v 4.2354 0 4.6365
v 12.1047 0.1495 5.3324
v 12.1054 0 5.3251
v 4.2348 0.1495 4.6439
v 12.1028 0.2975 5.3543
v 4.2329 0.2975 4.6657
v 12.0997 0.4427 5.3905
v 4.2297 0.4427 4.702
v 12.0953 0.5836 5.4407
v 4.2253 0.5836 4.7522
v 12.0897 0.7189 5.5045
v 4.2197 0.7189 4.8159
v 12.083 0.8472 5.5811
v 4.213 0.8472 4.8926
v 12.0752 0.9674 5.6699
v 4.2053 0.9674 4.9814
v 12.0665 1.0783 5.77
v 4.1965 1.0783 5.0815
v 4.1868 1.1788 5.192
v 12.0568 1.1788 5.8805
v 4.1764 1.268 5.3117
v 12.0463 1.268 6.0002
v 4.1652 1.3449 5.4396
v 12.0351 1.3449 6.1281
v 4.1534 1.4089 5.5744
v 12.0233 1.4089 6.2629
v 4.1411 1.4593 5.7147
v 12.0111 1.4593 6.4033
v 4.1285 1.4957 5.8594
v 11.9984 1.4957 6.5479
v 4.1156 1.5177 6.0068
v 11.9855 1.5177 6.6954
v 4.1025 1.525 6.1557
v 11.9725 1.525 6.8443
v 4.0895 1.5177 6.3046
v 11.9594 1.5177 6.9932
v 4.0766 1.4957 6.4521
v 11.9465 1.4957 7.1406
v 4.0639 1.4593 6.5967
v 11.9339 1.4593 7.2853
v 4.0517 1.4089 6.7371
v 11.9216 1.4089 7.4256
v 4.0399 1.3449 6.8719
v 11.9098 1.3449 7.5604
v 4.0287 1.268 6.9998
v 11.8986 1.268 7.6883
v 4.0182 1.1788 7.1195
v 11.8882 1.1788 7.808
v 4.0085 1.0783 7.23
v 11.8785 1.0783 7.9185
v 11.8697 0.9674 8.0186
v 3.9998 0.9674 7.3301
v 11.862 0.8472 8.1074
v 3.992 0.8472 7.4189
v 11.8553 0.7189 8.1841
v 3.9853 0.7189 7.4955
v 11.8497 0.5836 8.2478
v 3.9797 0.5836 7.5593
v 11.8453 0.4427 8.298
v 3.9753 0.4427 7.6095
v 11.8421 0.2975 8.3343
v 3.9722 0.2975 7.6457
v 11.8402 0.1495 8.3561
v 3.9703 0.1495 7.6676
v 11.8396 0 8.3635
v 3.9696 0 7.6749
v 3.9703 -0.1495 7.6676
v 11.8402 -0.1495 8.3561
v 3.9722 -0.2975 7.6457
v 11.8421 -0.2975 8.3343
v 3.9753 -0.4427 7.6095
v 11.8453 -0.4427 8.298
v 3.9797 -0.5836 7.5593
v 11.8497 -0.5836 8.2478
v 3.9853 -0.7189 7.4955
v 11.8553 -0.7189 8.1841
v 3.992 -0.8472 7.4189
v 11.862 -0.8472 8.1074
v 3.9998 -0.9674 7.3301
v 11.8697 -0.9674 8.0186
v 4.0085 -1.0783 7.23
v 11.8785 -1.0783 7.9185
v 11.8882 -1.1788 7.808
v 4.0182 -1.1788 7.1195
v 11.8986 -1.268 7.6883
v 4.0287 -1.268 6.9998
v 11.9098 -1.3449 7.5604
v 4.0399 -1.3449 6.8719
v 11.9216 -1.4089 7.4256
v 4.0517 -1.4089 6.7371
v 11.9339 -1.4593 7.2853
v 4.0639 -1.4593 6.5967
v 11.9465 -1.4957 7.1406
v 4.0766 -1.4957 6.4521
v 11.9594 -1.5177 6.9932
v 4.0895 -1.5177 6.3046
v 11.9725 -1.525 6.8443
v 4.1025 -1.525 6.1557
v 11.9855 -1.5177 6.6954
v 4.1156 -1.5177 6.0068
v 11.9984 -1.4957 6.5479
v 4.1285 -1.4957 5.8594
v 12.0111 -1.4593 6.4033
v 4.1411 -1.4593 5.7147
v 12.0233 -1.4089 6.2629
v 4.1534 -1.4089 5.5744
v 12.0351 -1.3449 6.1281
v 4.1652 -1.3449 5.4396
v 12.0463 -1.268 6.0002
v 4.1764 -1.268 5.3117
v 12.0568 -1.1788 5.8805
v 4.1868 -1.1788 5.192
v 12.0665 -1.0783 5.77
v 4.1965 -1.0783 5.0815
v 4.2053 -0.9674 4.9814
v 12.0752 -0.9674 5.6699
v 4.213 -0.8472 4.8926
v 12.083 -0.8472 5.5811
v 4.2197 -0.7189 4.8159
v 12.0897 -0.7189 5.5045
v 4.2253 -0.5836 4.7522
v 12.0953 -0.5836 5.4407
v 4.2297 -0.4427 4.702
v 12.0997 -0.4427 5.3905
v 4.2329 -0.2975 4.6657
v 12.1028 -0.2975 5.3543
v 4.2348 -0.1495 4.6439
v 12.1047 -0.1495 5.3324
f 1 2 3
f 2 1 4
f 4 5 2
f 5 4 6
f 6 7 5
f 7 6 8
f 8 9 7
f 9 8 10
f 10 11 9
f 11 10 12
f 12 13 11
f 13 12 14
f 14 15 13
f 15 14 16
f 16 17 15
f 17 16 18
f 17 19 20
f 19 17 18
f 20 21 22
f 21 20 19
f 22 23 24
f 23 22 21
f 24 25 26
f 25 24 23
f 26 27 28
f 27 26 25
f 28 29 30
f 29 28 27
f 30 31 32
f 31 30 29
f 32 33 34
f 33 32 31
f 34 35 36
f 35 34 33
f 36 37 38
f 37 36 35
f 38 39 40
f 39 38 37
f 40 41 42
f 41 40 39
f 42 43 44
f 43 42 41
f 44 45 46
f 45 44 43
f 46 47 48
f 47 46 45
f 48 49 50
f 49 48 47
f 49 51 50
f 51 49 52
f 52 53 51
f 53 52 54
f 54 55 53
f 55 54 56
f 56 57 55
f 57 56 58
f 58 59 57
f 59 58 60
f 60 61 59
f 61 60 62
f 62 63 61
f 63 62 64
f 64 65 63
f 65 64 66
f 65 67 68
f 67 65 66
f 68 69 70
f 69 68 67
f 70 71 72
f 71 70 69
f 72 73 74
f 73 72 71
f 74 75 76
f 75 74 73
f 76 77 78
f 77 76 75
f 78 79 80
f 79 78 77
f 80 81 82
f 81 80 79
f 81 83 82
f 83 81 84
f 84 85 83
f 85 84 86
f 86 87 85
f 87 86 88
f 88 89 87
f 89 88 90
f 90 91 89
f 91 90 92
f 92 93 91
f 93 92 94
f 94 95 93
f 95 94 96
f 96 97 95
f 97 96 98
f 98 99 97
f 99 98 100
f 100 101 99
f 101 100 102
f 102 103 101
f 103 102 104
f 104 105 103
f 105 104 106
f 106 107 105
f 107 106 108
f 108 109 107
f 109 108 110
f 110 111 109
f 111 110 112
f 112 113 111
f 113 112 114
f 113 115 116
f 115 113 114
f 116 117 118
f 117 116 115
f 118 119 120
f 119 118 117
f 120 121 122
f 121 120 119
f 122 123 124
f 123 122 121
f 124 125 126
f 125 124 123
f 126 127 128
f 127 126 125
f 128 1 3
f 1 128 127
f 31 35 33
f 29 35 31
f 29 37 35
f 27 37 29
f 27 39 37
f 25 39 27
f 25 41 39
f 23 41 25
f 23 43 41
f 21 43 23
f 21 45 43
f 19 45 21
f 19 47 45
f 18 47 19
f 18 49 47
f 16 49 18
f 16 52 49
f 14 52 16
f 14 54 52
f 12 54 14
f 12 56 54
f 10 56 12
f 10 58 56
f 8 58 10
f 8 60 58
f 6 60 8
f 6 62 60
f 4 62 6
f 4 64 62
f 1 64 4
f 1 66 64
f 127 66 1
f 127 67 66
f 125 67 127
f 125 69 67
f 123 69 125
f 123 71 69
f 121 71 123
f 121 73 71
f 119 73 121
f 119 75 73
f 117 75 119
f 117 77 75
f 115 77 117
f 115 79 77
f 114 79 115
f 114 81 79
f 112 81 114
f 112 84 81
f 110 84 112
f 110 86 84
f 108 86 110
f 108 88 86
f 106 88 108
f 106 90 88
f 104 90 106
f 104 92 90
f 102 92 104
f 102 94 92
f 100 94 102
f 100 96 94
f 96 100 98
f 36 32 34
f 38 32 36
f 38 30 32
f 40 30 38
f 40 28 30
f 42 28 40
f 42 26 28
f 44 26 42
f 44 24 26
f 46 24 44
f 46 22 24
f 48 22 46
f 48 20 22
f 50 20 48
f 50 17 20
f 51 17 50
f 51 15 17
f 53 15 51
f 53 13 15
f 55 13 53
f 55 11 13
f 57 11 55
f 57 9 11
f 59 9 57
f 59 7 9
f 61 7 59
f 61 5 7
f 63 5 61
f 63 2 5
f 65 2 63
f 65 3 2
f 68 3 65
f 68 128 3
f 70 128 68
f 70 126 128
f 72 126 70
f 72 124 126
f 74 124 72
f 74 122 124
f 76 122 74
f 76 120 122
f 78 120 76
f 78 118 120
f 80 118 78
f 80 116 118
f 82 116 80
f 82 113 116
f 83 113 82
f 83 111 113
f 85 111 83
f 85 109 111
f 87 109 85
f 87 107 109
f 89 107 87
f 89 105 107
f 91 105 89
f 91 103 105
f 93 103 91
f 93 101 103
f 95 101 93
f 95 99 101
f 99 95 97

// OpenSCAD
$fn = $preview ? 16 : 64;

pl_x = 11.0;
pl_y = 12.5;
pl_z = 1.7;

cy_d = 9.8;
cy_h = 8.8;
cy_hat_h = 2.0;
cy_hat_d1 = cy_d;
cy_hat_d2 = 7;

st_d = 3.05;
st_l = 7.9;
st_h = 6.5;
st_winkel = 5;

cut = pl_z + cy_h + cy_hat_h + 3;

%difference() {
    union() {
        cylinder(h=cy_h, r=cy_d/2);
        
        translate([0, 0, cy_h])
        cylinder(h=cy_hat_h, r1=cy_hat_d1/2, r2=cy_hat_d2/2, true);
        
        translate([ -(pl_x - cy_d)/2 , 0, -pl_z/2])
        cube([pl_x, pl_y, pl_z], true);
        
    }
    translate([cut/6 + cy_d/2 - 0.5, 0, cut/2 - pl_z - 1])
    cube([cut /3, pl_y, cut], true);
}
translate([cy_d - st_d/4 -1 , 0, st_h])
rotate([0, 90 - st_winkel, 0]) 
cylinder(h=st_l, r=st_d/2, center=true);
